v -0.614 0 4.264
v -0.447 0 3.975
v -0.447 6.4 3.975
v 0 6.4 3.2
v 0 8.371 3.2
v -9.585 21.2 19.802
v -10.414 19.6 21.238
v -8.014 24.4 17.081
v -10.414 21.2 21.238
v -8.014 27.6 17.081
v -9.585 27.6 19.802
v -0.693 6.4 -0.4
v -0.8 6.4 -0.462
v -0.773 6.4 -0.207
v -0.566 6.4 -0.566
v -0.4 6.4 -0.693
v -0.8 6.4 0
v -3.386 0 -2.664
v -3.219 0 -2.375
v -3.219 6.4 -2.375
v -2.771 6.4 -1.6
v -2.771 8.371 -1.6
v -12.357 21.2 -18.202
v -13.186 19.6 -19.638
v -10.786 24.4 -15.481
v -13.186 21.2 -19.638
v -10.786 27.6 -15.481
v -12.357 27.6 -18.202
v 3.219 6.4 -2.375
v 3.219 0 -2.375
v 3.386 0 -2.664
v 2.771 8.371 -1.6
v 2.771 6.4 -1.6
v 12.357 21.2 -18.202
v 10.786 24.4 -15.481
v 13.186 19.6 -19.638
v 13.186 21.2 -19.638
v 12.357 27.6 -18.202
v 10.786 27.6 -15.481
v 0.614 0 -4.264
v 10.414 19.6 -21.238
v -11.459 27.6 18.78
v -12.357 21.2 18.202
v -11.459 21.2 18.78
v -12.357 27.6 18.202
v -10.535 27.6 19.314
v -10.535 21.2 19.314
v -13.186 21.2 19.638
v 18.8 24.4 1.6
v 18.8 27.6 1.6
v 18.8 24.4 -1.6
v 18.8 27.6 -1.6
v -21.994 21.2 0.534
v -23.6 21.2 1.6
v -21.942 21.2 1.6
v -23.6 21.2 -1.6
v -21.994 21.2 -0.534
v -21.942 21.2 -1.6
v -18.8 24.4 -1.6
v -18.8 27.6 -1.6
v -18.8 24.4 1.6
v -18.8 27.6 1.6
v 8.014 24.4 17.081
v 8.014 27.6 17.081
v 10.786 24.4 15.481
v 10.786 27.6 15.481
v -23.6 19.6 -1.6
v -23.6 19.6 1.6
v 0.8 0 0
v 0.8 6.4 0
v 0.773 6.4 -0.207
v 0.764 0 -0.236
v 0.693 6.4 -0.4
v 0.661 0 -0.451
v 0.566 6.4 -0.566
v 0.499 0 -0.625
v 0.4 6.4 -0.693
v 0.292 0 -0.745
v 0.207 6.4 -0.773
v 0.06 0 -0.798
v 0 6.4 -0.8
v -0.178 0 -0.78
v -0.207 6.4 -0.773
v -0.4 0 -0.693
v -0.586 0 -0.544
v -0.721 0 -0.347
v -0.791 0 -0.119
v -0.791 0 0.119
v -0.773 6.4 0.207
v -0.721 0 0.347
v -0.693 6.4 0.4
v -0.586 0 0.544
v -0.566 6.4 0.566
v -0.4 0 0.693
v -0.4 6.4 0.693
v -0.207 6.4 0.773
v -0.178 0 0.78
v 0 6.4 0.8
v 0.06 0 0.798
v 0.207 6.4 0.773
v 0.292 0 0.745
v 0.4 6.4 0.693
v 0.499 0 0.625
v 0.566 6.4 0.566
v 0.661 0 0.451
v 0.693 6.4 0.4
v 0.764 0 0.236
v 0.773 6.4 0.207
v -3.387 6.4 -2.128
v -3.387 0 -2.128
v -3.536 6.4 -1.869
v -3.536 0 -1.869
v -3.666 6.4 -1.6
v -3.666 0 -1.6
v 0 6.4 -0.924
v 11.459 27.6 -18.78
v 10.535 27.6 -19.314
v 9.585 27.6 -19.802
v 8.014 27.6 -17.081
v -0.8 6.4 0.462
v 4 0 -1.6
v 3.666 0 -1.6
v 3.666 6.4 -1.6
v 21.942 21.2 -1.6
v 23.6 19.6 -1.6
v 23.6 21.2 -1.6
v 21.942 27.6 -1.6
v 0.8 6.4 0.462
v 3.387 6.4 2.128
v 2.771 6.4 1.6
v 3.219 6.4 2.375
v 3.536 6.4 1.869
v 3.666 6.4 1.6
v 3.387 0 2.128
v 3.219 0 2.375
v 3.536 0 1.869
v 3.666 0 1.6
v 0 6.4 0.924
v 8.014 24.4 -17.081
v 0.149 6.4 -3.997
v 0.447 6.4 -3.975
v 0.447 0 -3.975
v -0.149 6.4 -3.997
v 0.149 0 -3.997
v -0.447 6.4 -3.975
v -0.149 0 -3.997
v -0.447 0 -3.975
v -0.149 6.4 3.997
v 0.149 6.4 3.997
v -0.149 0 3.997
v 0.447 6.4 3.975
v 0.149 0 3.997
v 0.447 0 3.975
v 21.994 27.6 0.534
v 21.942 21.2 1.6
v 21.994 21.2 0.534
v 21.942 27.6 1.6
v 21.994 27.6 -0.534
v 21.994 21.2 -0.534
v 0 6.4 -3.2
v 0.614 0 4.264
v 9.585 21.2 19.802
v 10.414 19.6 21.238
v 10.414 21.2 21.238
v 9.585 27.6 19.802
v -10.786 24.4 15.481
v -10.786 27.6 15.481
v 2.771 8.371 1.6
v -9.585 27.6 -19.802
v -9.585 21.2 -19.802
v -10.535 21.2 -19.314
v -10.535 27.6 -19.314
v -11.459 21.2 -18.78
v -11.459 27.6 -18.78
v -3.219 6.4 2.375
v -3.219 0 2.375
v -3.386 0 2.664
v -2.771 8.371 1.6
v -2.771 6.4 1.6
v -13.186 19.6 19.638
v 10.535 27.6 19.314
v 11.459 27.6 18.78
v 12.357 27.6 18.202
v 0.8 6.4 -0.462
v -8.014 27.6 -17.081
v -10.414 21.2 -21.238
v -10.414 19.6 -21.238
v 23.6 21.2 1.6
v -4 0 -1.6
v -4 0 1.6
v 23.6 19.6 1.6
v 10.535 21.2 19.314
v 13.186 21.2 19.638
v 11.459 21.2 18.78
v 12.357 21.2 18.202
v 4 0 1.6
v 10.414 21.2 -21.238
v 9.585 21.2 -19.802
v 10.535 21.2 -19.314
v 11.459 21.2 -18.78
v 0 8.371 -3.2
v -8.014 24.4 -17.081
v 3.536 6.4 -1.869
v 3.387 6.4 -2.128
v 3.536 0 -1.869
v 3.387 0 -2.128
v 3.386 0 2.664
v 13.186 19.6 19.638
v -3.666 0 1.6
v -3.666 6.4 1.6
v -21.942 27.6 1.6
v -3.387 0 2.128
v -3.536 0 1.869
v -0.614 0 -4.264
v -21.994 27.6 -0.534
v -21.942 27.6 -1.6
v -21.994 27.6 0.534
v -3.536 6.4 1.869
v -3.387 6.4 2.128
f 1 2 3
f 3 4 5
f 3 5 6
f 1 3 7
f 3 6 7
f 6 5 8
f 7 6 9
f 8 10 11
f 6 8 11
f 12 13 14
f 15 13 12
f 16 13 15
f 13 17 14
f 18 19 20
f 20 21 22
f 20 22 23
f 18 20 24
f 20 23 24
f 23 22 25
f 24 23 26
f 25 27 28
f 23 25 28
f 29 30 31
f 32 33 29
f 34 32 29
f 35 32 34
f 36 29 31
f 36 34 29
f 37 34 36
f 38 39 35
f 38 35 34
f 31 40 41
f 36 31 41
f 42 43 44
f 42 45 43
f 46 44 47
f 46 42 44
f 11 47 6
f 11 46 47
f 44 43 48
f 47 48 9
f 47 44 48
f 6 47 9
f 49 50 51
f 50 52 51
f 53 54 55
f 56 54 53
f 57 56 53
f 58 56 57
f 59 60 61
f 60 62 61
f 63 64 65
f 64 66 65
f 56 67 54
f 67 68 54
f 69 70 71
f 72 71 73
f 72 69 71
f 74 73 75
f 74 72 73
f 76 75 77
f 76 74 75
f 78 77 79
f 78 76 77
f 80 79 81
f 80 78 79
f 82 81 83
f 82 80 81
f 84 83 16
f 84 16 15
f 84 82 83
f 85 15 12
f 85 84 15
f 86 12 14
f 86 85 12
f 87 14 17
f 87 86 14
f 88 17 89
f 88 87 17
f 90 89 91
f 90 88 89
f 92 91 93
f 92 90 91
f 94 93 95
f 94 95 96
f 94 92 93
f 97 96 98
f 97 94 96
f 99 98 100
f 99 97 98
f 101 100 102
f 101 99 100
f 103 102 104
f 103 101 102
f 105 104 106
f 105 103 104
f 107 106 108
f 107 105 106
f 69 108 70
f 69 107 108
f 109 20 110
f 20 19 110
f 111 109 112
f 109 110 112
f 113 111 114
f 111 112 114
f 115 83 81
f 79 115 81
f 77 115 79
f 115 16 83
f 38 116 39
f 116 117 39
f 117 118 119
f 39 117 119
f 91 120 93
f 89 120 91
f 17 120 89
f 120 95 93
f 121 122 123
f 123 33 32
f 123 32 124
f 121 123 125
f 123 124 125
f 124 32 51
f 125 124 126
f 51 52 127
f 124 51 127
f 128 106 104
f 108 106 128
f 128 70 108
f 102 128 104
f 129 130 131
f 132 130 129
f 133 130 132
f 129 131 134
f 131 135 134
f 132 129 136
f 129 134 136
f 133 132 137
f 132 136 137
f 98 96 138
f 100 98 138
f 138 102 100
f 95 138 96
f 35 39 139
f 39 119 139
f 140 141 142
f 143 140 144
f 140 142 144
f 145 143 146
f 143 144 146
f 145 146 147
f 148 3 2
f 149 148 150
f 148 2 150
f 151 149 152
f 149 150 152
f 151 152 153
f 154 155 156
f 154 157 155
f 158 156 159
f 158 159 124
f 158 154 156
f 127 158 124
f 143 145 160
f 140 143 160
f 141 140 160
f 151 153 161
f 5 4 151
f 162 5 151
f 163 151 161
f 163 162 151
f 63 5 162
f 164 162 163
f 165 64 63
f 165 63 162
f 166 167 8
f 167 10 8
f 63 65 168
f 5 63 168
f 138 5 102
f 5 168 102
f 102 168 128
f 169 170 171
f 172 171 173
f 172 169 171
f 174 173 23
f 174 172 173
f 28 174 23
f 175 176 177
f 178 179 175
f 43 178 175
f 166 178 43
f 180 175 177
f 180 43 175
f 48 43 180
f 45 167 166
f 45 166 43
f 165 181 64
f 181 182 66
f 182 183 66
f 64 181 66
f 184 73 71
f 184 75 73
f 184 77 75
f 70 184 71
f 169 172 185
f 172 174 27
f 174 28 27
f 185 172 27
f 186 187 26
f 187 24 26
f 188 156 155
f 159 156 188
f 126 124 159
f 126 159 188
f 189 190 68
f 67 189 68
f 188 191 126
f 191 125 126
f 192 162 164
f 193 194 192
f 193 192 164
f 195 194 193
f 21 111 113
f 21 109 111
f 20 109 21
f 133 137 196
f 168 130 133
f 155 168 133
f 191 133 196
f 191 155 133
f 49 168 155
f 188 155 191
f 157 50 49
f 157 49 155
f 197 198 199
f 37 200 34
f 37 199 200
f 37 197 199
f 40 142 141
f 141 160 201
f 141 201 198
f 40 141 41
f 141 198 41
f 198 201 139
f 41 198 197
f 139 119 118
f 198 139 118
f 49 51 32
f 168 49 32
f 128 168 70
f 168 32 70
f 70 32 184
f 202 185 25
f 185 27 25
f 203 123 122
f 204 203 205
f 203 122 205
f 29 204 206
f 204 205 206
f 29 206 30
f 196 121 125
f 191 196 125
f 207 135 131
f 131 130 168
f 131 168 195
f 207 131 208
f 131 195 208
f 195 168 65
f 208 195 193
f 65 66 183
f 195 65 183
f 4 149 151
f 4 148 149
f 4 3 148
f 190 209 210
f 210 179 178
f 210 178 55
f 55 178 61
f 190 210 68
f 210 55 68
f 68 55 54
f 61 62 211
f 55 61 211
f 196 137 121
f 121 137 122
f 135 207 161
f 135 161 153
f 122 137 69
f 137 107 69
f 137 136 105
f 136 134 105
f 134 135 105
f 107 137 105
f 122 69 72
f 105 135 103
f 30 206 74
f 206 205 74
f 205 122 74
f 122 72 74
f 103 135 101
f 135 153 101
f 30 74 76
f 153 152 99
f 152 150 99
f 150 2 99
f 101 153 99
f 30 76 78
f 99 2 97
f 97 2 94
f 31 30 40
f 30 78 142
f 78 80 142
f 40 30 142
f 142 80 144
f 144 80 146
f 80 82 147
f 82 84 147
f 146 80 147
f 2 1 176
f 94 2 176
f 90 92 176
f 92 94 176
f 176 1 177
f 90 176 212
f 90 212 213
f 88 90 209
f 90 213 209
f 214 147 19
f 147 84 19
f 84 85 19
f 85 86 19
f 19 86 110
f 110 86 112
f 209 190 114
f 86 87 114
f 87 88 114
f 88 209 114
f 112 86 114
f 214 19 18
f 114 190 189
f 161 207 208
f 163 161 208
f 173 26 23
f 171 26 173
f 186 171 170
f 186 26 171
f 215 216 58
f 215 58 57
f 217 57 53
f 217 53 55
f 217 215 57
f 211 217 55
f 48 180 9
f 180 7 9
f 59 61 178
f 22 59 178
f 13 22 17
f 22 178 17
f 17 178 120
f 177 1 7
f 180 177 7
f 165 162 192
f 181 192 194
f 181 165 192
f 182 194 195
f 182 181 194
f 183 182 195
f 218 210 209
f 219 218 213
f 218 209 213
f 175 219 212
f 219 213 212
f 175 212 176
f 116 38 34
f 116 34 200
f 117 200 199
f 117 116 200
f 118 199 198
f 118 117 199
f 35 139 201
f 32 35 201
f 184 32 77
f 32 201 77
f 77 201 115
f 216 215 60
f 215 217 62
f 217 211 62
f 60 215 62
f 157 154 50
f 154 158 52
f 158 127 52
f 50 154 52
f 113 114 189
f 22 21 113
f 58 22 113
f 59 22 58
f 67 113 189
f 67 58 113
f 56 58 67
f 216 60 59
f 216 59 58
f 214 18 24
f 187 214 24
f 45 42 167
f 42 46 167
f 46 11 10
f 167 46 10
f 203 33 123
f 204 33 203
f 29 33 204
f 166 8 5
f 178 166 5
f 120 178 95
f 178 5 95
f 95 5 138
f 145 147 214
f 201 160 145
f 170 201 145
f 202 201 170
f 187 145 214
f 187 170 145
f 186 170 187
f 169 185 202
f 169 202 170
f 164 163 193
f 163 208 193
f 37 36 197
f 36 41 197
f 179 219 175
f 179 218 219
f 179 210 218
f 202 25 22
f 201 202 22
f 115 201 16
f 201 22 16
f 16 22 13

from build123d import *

# Parameters (mm, degrees)
SKETCH1_R           = 4
SKETCH1_R_2         = 0.8
BOSS_EXTRUDE1_DEPTH = 6.4
BOSS_EXTRUDE2_DEPTH = 1.6
CIRPATTERN1_COUNT   = 6
SKETCH3_R           = 23.654175107
SKETCH3_R_2         = 22
CUT_EXTRUDE1_DEPTH  = 6.4


with BuildPart() as part:
    # Sketch1 → Boss-Extrude1 (new body)
    with BuildSketch(Plane(origin=(0, 0, 0), x_dir=(1, 0, 0), z_dir=(0, 1, 0))):
        Circle(SKETCH1_R)
        Circle(SKETCH1_R_2, mode=Mode.SUBTRACT)
    extrude(amount=BOSS_EXTRUDE1_DEPTH)

    # Sketch2 → Boss-Extrude2 (add, symmetric)
    with BuildSketch(Plane.XY):
        Polygon((-4, 0), (-23.6, 19.6), (-23.6, 21.2), (-22, 21.2), (-22, 27.6), (-18.8, 27.6), (-18.8, 24.4), (-0.8, 6.4), (-0.8, 0), align=None)
    boss_extrude2 = extrude(amount=BOSS_EXTRUDE2_DEPTH, both=True)

    # CirPattern1: Boss-Extrude2 ×6 about axis
    cirpattern1_axis = Axis((0, 0, 0), (0, 1, 0))
    for i in range(1, CIRPATTERN1_COUNT):
        add(boss_extrude2.rotate(cirpattern1_axis, i * 360 / CIRPATTERN1_COUNT))

    # Sketch3 → Cut-Extrude1 (cut)
    with BuildSketch(Plane(origin=(0, 27.6, 0), x_dir=(1, 0, 0), z_dir=(0, 1, 0))):
        Circle(SKETCH3_R)
        Circle(SKETCH3_R_2, mode=Mode.SUBTRACT)
    extrude(amount=-CUT_EXTRUDE1_DEPTH, mode=Mode.SUBTRACT)


solid = part.part
